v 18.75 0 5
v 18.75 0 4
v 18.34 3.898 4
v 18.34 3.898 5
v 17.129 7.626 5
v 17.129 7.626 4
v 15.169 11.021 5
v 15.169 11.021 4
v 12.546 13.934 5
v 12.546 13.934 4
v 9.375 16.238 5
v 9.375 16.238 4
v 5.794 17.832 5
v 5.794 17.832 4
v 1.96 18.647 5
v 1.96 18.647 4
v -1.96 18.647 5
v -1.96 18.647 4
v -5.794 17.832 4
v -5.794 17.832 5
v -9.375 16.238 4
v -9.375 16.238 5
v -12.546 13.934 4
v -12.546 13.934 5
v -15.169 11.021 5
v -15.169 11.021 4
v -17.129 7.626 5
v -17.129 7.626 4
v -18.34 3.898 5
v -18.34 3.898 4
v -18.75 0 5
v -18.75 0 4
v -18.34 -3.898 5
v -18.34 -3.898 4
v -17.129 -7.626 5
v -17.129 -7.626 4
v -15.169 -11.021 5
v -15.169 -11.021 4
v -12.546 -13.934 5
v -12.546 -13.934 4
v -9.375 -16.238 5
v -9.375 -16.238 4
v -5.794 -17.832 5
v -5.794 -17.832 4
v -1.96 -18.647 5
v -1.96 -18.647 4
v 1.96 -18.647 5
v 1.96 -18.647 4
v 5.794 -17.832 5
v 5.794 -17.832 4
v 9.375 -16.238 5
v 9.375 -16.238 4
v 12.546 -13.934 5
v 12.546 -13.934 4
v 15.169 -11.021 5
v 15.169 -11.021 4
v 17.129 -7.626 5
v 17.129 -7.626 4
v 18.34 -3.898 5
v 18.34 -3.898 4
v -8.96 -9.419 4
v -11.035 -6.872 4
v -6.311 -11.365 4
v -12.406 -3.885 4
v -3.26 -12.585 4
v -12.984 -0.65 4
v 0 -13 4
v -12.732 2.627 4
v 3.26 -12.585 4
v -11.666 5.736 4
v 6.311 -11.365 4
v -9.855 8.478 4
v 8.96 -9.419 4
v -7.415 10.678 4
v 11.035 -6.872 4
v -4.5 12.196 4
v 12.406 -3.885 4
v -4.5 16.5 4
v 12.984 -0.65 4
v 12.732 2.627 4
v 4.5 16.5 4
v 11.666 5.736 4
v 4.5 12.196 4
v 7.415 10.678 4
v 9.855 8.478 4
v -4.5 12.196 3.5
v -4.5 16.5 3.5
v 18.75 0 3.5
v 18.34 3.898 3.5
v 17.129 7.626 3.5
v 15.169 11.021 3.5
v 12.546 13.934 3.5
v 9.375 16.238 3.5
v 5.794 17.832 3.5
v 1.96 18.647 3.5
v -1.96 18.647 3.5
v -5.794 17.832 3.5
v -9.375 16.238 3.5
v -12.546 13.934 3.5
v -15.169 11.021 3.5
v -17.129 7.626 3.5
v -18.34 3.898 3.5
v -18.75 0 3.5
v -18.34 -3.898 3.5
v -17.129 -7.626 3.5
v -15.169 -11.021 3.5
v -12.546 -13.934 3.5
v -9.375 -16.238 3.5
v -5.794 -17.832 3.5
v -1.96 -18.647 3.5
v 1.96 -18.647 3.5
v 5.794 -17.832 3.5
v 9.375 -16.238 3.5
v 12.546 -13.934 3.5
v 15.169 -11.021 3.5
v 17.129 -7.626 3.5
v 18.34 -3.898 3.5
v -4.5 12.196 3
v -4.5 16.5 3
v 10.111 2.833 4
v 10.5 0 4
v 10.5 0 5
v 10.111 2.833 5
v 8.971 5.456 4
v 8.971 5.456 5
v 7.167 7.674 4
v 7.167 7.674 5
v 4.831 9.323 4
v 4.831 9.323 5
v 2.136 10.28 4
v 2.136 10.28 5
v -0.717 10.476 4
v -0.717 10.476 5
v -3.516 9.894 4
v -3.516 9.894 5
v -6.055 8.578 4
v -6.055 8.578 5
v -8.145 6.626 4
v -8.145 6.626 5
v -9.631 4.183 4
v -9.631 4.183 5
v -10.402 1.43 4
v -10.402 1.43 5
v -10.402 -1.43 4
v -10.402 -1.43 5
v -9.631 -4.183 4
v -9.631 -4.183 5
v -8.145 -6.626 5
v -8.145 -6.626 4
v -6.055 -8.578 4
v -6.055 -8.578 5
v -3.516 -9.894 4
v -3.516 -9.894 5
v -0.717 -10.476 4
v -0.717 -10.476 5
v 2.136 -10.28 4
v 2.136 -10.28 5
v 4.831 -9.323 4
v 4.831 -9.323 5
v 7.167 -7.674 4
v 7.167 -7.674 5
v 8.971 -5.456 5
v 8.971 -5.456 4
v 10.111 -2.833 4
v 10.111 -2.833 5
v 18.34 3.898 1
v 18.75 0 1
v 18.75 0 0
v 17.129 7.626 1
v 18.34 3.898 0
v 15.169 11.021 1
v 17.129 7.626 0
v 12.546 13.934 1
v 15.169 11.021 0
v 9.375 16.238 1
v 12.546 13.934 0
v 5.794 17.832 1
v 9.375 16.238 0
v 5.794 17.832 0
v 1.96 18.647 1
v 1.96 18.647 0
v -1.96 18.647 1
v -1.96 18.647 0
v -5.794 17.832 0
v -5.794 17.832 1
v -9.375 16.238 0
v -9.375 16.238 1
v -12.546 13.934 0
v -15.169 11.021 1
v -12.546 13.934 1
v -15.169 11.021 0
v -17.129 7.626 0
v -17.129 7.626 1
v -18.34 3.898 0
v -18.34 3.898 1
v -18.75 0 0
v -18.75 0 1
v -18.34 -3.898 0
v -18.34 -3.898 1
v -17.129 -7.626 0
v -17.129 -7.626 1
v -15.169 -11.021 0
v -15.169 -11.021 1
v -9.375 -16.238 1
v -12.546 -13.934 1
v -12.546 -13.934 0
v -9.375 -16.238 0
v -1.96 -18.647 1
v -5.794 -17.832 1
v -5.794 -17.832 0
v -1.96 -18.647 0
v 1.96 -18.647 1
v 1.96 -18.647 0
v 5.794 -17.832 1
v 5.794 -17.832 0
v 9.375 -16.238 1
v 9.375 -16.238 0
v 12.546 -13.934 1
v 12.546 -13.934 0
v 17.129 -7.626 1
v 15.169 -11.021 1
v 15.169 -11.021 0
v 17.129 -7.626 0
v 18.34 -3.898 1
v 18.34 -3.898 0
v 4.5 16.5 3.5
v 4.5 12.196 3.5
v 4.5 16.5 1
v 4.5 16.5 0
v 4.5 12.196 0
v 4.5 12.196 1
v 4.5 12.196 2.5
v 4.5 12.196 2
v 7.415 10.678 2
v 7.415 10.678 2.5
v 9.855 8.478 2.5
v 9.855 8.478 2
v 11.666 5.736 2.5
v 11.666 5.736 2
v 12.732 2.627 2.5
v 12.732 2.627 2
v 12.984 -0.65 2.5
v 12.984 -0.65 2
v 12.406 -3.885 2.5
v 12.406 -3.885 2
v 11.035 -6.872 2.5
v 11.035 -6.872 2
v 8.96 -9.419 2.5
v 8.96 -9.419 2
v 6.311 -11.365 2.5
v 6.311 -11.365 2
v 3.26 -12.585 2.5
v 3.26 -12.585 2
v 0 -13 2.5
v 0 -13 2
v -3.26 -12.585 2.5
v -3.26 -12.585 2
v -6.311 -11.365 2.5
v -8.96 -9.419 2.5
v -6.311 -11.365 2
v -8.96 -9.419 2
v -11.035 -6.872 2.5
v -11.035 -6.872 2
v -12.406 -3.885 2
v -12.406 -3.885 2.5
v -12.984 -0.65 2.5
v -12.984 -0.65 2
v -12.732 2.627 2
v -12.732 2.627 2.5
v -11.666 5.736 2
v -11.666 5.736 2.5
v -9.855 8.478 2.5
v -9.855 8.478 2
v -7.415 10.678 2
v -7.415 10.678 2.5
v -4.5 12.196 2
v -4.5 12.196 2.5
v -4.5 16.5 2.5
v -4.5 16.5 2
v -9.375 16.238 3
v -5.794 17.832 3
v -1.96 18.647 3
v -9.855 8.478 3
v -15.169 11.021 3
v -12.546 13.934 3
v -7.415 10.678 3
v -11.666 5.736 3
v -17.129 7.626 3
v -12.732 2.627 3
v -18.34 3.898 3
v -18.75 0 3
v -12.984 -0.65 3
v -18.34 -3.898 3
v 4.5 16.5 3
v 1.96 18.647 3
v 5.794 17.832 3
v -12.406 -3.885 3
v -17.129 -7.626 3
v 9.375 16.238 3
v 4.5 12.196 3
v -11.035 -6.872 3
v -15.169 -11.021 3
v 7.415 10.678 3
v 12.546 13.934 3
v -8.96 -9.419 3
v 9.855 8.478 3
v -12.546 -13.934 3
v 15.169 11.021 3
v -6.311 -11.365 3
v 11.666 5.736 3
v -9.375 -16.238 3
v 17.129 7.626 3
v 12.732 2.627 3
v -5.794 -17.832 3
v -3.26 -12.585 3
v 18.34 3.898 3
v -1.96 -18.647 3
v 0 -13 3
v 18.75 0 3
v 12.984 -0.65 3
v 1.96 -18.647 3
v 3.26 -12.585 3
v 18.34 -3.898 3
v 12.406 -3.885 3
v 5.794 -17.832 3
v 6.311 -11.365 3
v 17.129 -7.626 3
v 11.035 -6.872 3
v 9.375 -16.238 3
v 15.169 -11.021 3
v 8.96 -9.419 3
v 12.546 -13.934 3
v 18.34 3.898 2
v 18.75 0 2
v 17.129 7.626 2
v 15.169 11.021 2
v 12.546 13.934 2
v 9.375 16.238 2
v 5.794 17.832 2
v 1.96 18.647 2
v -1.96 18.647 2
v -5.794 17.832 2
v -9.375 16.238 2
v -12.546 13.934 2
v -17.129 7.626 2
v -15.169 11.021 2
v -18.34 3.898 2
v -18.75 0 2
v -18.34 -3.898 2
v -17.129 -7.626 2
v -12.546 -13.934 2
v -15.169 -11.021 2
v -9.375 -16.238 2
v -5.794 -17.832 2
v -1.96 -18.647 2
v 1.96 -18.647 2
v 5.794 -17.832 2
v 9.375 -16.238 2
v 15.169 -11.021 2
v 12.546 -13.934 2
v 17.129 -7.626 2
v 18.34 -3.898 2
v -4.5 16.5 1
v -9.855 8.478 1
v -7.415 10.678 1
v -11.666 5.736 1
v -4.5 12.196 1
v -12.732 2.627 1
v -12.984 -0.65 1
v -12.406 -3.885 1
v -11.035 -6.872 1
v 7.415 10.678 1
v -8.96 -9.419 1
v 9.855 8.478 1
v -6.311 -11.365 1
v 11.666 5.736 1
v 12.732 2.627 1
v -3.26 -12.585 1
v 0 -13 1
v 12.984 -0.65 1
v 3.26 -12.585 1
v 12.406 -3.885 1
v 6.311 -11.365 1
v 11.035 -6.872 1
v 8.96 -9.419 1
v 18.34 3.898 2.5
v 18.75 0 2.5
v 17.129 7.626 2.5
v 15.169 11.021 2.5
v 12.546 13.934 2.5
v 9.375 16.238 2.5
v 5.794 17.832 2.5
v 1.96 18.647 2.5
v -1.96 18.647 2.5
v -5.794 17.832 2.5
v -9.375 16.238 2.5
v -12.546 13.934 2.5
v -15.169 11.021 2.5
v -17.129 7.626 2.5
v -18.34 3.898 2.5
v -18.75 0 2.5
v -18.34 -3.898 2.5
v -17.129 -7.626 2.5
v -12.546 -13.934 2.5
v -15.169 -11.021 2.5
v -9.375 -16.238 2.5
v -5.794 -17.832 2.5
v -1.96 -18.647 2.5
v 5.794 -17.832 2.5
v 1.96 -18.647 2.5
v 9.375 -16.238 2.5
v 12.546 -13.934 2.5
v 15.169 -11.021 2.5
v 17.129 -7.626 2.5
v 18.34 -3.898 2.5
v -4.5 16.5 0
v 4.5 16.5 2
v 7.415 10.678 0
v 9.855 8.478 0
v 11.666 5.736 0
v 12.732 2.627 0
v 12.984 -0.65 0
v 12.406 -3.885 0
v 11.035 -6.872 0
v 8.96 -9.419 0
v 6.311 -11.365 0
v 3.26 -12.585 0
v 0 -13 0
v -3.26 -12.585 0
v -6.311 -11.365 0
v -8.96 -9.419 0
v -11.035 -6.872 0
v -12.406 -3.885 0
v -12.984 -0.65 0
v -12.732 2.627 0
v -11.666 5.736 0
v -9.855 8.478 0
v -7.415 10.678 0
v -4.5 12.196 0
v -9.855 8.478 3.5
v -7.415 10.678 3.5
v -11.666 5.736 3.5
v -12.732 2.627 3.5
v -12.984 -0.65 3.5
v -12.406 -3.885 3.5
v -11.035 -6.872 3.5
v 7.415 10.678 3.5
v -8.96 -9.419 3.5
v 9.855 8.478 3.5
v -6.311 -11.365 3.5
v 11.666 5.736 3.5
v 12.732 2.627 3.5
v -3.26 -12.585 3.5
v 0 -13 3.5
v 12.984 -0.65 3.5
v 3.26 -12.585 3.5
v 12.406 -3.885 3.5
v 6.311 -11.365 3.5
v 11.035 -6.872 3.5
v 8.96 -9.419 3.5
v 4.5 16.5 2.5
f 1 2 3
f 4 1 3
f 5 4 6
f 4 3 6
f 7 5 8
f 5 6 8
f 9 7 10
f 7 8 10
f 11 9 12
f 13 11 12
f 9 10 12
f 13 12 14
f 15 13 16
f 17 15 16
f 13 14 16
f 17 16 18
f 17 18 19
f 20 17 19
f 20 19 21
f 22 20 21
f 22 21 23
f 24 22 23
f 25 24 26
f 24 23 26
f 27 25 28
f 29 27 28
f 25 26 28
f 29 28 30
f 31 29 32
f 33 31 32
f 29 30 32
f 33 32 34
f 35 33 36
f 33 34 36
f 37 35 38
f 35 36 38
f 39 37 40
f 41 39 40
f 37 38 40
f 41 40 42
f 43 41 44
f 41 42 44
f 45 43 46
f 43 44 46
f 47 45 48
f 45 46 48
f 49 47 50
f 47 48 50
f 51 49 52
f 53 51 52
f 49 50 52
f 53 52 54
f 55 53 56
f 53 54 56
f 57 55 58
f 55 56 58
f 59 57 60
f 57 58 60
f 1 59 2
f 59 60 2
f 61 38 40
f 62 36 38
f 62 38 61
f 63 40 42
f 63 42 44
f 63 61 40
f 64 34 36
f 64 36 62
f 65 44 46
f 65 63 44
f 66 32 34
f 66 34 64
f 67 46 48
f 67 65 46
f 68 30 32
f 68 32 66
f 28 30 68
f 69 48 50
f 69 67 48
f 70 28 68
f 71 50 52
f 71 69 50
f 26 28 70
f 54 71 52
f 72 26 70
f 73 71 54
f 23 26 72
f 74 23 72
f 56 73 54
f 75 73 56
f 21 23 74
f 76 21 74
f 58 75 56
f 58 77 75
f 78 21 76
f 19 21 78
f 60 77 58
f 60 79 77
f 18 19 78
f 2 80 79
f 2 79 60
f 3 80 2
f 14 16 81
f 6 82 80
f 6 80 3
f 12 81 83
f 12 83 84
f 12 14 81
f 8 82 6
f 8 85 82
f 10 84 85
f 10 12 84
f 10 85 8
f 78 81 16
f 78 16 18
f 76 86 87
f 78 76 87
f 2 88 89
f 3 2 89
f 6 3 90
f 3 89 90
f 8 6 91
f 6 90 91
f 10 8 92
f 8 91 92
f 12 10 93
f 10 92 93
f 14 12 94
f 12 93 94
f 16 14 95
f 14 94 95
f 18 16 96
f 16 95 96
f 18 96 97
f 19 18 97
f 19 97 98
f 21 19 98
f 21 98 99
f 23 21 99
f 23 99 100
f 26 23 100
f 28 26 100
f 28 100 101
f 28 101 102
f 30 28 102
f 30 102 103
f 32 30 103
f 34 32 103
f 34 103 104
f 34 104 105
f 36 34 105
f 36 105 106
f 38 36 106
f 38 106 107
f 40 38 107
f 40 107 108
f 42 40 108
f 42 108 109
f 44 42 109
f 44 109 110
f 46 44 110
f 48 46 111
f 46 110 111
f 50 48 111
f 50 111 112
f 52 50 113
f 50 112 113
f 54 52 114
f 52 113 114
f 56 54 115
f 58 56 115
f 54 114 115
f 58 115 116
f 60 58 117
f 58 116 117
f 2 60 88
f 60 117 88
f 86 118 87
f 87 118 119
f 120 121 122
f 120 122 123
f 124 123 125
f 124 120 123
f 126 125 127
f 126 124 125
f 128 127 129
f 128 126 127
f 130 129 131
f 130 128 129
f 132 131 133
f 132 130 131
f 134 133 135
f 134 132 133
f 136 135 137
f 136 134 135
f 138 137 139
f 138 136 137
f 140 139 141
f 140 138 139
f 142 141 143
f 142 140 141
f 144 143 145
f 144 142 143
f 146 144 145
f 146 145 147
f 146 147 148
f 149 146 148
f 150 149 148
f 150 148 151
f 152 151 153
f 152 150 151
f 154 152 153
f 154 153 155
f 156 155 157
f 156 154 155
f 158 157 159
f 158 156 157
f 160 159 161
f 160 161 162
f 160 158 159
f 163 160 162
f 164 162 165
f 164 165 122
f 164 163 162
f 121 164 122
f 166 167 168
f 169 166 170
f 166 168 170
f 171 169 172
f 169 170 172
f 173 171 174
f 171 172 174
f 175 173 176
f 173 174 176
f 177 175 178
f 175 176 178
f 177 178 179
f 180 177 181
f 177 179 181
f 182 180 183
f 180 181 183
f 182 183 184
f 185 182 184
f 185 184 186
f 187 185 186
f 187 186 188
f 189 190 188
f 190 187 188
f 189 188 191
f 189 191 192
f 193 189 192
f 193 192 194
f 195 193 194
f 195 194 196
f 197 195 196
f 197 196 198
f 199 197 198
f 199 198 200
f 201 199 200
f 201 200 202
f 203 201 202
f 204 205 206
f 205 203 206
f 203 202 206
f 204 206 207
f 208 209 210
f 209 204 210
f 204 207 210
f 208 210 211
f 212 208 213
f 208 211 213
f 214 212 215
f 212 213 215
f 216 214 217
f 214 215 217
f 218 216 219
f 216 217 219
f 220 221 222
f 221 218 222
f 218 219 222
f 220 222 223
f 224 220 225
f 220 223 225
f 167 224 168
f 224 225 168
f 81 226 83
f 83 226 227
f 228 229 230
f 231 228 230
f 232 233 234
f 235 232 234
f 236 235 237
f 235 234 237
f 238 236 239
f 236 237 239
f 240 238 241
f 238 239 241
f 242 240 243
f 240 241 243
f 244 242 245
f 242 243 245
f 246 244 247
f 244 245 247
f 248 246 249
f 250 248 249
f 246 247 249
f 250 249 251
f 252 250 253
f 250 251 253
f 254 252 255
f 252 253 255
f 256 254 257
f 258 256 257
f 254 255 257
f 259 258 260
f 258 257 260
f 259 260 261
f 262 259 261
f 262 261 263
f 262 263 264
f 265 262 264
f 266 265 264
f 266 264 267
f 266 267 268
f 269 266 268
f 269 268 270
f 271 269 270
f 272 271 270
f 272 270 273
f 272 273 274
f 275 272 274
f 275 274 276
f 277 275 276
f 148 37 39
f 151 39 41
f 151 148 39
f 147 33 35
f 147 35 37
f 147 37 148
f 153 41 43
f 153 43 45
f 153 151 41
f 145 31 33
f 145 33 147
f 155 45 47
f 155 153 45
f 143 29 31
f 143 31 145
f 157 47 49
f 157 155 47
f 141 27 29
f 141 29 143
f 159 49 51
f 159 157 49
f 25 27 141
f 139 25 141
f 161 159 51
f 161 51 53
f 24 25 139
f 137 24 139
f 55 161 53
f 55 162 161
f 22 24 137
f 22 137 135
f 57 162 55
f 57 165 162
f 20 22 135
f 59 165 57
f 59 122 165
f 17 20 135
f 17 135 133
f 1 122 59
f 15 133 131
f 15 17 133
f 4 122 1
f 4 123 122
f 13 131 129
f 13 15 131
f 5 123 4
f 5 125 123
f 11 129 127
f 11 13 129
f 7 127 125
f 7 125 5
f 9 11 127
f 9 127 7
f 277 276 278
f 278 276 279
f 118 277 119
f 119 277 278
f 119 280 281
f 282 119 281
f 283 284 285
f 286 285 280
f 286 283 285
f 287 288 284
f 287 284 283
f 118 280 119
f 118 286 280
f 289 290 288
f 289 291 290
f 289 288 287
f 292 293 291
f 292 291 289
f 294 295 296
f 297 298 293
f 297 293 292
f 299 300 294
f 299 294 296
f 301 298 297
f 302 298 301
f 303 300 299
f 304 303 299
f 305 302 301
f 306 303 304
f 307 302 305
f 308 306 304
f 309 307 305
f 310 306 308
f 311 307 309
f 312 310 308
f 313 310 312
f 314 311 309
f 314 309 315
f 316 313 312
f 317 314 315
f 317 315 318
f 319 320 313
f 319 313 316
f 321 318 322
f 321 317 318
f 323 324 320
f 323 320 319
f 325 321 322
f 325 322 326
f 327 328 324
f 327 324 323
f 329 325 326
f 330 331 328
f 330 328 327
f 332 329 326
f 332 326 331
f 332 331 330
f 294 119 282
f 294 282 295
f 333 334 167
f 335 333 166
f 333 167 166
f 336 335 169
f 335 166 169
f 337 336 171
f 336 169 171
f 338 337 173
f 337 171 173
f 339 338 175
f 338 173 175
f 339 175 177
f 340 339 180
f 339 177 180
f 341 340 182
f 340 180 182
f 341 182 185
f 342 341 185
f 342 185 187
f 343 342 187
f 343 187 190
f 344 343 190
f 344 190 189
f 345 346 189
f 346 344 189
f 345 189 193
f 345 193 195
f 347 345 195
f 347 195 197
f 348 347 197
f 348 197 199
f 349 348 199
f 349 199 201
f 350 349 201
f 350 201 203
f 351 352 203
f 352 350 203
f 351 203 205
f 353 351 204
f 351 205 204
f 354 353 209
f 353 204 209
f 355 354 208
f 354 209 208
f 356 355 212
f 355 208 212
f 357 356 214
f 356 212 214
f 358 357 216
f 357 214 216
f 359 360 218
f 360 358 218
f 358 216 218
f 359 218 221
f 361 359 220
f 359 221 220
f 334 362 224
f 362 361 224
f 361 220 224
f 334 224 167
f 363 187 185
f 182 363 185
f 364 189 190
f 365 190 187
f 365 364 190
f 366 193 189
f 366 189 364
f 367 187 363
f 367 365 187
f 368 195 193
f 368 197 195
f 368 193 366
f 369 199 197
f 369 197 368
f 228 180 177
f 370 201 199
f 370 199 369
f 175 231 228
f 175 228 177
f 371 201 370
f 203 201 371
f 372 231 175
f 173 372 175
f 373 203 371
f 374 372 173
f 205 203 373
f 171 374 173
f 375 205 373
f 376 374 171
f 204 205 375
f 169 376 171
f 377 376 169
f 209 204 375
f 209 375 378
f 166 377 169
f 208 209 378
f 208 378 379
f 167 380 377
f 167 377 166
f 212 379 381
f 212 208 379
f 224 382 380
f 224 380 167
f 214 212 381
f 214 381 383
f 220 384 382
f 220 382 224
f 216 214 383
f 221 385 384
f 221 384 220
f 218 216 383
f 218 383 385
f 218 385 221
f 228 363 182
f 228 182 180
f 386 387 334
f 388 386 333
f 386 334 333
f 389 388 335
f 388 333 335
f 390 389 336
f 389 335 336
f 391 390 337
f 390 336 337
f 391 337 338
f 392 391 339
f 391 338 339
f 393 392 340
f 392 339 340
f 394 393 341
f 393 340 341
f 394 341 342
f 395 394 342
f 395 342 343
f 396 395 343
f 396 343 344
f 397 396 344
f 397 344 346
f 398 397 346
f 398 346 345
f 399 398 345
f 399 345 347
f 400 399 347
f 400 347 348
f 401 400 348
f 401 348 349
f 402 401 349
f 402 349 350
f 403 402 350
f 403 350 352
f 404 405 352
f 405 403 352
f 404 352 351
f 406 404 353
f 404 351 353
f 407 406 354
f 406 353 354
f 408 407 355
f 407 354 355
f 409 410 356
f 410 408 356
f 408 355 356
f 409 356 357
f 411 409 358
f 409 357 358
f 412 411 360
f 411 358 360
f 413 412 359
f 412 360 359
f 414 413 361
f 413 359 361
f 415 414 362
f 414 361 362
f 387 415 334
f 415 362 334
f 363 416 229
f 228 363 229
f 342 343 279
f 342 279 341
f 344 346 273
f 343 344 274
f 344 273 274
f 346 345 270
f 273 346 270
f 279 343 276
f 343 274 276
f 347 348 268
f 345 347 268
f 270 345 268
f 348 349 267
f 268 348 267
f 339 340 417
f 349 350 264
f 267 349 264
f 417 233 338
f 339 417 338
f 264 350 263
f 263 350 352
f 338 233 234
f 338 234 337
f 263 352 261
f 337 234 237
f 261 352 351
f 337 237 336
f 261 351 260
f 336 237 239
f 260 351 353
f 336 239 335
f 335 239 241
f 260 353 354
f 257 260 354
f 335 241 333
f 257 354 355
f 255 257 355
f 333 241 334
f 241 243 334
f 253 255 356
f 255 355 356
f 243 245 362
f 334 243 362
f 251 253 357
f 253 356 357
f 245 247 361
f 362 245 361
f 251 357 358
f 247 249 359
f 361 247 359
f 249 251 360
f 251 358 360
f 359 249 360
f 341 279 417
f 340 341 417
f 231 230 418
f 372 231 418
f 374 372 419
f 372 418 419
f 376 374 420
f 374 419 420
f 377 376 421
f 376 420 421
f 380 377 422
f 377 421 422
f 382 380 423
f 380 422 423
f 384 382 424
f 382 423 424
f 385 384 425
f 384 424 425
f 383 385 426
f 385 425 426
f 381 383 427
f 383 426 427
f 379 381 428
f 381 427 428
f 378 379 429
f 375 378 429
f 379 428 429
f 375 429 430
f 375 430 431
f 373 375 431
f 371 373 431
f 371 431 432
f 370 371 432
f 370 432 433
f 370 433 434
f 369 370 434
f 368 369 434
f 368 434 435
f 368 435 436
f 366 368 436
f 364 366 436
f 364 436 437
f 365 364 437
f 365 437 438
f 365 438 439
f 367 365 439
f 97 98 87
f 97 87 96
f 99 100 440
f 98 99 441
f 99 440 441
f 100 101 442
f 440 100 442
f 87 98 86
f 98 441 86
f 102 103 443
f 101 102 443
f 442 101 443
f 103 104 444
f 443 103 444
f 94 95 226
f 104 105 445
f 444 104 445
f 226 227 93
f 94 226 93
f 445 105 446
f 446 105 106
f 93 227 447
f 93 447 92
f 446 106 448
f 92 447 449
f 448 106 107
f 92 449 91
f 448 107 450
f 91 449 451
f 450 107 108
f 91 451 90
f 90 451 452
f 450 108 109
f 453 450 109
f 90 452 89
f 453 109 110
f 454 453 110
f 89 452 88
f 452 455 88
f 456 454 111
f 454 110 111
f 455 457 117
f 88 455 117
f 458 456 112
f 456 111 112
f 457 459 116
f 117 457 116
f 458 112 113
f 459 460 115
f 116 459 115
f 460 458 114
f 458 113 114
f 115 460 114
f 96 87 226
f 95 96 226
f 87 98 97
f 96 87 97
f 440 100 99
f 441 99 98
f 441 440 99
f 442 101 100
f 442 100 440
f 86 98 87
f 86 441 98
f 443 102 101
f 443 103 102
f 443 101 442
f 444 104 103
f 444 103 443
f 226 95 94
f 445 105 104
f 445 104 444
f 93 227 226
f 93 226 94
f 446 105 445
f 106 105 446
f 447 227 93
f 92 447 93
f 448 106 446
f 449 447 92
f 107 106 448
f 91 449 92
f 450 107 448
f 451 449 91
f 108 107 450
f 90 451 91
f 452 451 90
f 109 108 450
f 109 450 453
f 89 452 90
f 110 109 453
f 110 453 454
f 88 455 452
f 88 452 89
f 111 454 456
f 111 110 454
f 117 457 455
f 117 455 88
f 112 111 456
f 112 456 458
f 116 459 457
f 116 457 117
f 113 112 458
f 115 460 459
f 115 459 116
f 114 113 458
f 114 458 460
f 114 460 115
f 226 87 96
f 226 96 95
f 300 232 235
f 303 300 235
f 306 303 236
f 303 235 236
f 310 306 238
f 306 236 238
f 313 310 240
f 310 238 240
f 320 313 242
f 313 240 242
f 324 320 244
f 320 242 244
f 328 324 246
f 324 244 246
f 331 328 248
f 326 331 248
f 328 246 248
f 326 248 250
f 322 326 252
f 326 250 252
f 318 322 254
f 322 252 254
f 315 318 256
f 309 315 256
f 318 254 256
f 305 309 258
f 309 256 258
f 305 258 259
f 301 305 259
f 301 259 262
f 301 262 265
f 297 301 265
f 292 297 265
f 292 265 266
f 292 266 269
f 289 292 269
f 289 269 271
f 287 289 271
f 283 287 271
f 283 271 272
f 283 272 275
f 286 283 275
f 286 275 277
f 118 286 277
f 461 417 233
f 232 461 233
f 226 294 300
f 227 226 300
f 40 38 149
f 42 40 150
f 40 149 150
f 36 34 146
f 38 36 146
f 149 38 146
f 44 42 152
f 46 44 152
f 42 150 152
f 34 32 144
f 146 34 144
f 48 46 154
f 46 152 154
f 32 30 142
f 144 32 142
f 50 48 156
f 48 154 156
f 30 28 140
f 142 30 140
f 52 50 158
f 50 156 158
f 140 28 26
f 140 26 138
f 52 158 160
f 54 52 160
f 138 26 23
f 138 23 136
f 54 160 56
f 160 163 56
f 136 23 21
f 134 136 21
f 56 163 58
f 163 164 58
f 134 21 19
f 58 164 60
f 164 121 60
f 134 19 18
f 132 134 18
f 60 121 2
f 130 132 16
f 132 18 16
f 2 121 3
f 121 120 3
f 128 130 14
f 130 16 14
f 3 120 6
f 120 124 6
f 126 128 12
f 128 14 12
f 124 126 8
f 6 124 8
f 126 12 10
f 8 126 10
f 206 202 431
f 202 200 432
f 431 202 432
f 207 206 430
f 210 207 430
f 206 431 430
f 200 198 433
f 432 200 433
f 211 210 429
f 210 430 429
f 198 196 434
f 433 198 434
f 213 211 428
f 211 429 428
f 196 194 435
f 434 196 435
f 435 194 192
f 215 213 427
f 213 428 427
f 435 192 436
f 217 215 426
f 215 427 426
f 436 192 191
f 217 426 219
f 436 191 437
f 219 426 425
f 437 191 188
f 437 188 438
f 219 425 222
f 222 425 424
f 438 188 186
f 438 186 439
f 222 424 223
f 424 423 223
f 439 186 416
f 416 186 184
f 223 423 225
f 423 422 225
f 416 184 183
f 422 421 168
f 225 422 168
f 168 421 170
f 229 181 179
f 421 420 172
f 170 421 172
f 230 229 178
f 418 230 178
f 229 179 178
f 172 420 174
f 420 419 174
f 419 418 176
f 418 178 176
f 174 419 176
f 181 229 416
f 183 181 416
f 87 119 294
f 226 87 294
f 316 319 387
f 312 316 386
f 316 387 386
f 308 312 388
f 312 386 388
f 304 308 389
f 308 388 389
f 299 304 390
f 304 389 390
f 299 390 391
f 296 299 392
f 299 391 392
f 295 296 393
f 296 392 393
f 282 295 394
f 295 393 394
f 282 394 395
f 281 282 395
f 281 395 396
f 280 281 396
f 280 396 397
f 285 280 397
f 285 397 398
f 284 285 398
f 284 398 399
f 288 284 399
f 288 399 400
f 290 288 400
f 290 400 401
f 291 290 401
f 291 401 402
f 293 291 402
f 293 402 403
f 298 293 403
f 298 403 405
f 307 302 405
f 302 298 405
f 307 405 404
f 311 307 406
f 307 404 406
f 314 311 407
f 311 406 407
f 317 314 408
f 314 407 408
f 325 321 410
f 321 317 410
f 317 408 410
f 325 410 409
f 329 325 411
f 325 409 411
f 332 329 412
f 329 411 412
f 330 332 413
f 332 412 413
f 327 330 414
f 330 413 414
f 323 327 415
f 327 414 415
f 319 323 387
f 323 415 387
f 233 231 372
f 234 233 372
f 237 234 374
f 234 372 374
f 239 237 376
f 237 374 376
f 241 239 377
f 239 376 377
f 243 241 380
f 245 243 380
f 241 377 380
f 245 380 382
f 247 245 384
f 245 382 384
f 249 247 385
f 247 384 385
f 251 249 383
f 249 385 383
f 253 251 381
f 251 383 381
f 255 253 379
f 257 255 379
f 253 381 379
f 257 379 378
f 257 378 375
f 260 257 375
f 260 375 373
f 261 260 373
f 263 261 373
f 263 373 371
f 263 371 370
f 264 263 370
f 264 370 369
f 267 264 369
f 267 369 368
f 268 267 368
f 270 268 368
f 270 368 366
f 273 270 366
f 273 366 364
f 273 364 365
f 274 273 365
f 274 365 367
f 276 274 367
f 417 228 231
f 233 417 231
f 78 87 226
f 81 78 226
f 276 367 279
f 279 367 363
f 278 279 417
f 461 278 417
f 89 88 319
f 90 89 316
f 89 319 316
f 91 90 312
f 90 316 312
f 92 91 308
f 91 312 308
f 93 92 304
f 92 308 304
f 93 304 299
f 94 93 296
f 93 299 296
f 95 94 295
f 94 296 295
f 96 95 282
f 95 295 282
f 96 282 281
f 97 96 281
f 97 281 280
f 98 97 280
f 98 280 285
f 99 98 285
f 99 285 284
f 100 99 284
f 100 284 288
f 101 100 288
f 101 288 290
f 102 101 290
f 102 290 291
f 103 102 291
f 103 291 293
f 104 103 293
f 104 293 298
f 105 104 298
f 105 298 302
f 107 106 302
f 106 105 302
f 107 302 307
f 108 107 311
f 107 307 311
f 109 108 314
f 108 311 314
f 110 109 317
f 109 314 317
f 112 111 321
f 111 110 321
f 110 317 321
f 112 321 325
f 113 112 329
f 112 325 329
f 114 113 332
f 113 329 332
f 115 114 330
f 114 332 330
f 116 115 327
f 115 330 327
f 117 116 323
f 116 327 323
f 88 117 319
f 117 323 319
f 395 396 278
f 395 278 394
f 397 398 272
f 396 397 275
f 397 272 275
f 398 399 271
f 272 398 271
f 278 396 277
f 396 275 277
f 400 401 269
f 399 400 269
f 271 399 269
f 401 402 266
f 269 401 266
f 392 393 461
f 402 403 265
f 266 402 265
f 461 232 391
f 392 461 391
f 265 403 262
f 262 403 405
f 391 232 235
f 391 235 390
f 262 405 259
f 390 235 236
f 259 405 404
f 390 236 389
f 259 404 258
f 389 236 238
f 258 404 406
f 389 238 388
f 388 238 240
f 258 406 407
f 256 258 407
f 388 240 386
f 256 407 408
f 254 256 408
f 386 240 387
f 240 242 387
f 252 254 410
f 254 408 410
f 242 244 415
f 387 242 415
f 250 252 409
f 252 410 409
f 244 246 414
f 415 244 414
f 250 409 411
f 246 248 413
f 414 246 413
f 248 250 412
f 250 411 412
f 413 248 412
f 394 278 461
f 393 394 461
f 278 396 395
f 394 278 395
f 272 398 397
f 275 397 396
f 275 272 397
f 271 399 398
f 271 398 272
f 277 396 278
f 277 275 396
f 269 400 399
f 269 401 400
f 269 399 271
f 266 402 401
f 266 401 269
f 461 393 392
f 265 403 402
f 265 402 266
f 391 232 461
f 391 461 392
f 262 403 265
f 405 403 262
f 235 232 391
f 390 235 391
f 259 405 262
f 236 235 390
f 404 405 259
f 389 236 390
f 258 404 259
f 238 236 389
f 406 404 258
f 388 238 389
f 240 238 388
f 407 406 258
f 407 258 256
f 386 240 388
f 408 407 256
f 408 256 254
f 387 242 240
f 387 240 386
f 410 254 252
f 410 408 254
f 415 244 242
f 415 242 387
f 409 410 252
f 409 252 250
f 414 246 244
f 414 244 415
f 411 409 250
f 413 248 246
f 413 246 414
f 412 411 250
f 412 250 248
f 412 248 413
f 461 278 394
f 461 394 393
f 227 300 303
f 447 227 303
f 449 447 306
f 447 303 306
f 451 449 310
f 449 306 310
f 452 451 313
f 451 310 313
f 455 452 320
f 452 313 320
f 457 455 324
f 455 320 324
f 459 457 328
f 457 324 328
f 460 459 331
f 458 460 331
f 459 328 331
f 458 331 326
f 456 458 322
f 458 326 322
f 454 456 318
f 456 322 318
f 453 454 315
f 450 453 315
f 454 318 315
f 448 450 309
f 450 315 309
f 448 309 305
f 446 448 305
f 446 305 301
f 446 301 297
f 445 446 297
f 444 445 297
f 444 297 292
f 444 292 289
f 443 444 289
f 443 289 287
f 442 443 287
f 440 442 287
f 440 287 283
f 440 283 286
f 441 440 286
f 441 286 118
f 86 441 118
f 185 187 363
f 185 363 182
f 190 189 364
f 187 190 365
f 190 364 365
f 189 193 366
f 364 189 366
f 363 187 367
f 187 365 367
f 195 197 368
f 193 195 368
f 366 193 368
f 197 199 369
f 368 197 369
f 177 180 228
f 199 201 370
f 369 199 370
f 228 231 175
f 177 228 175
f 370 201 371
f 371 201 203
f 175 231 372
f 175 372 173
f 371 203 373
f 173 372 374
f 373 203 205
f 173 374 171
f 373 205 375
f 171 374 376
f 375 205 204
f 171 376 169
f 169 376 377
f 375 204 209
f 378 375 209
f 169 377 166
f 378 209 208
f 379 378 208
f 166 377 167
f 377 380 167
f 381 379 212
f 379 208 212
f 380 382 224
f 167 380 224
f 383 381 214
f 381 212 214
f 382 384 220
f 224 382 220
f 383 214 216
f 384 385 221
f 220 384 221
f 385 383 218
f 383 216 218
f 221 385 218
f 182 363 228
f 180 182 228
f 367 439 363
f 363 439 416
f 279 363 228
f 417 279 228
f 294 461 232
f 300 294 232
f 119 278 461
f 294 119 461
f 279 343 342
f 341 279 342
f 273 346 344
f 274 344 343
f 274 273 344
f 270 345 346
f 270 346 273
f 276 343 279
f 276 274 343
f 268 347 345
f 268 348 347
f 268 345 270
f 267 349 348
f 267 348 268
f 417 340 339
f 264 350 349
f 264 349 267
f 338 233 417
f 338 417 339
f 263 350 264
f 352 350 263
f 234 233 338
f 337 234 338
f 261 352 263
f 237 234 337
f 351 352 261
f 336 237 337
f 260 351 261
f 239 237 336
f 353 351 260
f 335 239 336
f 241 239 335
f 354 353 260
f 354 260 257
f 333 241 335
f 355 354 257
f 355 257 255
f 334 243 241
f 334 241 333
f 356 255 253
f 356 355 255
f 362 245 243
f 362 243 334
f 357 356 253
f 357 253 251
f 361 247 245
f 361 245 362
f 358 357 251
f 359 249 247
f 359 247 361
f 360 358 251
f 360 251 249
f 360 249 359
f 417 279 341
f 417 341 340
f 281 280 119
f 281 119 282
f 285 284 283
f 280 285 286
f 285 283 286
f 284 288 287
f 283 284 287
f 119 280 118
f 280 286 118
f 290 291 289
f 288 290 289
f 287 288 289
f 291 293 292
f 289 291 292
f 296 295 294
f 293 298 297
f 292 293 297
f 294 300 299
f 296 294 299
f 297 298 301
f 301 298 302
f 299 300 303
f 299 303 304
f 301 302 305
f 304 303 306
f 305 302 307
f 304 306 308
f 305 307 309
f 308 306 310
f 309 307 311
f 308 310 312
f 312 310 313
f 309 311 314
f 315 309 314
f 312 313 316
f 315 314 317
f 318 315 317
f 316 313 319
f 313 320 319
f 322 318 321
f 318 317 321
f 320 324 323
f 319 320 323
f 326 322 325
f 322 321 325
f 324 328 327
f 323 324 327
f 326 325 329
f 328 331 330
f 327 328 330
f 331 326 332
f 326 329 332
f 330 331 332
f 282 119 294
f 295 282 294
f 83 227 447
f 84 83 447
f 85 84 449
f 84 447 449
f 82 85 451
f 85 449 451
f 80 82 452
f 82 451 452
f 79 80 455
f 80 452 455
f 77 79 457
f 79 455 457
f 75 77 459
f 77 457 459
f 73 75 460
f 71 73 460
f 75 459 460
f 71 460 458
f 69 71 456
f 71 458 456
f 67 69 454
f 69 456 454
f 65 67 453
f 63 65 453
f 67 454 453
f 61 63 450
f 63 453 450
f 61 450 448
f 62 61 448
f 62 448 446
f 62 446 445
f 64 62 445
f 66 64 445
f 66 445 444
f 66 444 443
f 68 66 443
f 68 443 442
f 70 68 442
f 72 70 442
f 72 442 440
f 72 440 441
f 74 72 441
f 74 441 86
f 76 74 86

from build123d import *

# Parameters (mm, degrees)
SKETCH_1_R                        = 18.75
EXTRUDE_1_DEPTH                   = 4
SPLIT_BODIES_1_SURFACE_3_1_BACK   = 54.184
SPLIT_BODIES_1_SURFACE_3_1_DEPTH  = 108.368
SPLIT_BODIES_1_SURFACE_3_2_BACK   = 54.184
SPLIT_BODIES_1_SURFACE_3_2_DEPTH  = 108.368
SPLIT_BODIES_1_SURFACE_4_3_BACK   = 54.184
SPLIT_BODIES_1_SURFACE_4_3_DEPTH  = 108.368
SPLIT_BODIES_1_SURFACE_4_4_BACK   = 54.184
SPLIT_BODIES_1_SURFACE_4_4_DEPTH  = 108.368
SPLIT_BODIES_1_SURFACE_5_5_BACK   = 54.184
SPLIT_BODIES_1_SURFACE_5_5_DEPTH  = 108.368
SPLIT_BODIES_1_SURFACE_5_6_BACK   = 54.184
SPLIT_BODIES_1_SURFACE_5_6_DEPTH  = 108.368
SPLIT_BODIES_1_SURFACE_6_7_BACK   = 54.184
SPLIT_BODIES_1_SURFACE_6_7_DEPTH  = 108.368
SPLIT_BODIES_1_SURFACE_6_8_BACK   = 54.184
SPLIT_BODIES_1_SURFACE_6_8_DEPTH  = 108.368
SPLIT_BODIES_1_SURFACE_7_9_BACK   = 54.184
SPLIT_BODIES_1_SURFACE_7_9_DEPTH  = 108.368
SPLIT_BODIES_1_SURFACE_7_10_BACK  = 54.184
SPLIT_BODIES_1_SURFACE_7_10_DEPTH = 108.368
SKETCH_3_R                        = 18.75
SKETCH_3_R_2                      = 10.5
EXTRUDE_2_DEPTH                   = 1


with BuildPart() as part:
    # Эскиз1 → Вытянуть1 (new body)
    with BuildSketch(Plane.XY):
        Circle(SKETCH_1_R)
        with BuildLine():
            Line((-4.5, 16.5), (4.5, 16.5))
            Line((4.5, 16.5), (4.5, 12.196310918))
            ThreePointArc((4.5, 12.196310918), (0, -13), (-4.5, 12.196310918))
            Line((-4.5, 12.196310918), (-4.5, 16.5))
        make_face(mode=Mode.SUBTRACT)
    extrude(amount=EXTRUDE_1_DEPTH)


with BuildPart() as body_2_3:
    # Split Bodies 1 3: the piece behind the surface
    add(part.part)
    # Split Bodies 1 surface 3: a surface, the sketch's curves swept straight by 108.368 mm
    with BuildLine(Plane(origin=(0, 0, 0), x_dir=(1, 0, 0), z_dir=(0, 1, 0)).offset(-SPLIT_BODIES_1_SURFACE_3_1_BACK), mode=Mode.PRIVATE) as split_bodies_1_surface_3_1_path:
        Line((-18.75, -1), (18.75, -1))
    split_bodies_1_surface_3_1 = Shell.extrude(split_bodies_1_surface_3_1_path.wire(), (0 * SPLIT_BODIES_1_SURFACE_3_1_DEPTH, 1 * SPLIT_BODIES_1_SURFACE_3_1_DEPTH, 0 * SPLIT_BODIES_1_SURFACE_3_1_DEPTH))
    split(bisect_by=split_bodies_1_surface_3_1, keep=Keep.BOTTOM)


with BuildPart() as part_1:
    add(part.part)

    # Split Bodies 1 3: split by a surface, the side it looks to stays
    # Split Bodies 1 surface 3: a surface, the sketch's curves swept straight by 108.368 mm
    with BuildLine(Plane(origin=(0, 0, 0), x_dir=(1, 0, 0), z_dir=(0, 1, 0)).offset(-SPLIT_BODIES_1_SURFACE_3_2_BACK), mode=Mode.PRIVATE) as split_bodies_1_surface_3_2_path:
        Line((-18.75, -1), (18.75, -1))
    split_bodies_1_surface_3_2 = Shell.extrude(split_bodies_1_surface_3_2_path.wire(), (0 * SPLIT_BODIES_1_SURFACE_3_2_DEPTH, 1 * SPLIT_BODIES_1_SURFACE_3_2_DEPTH, 0 * SPLIT_BODIES_1_SURFACE_3_2_DEPTH))
    split(bisect_by=split_bodies_1_surface_3_2, keep=Keep.TOP)


with BuildPart() as body_3:
    # Split Bodies 1 4 body 2 3: the piece behind the surface
    add(body_2_3.part)
    # Split Bodies 1 surface 4: a surface, the sketch's curves swept straight by 108.368 mm
    with BuildLine(Plane(origin=(0, 0, 0), x_dir=(1, 0, 0), z_dir=(0, 1, 0)).offset(-SPLIT_BODIES_1_SURFACE_4_3_BACK), mode=Mode.PRIVATE) as split_bodies_1_surface_4_3_path:
        Line((-18.75, -2), (18.75, -2))
    split_bodies_1_surface_4_3 = Shell.extrude(split_bodies_1_surface_4_3_path.wire(), (0 * SPLIT_BODIES_1_SURFACE_4_3_DEPTH, 1 * SPLIT_BODIES_1_SURFACE_4_3_DEPTH, 0 * SPLIT_BODIES_1_SURFACE_4_3_DEPTH))
    split(bisect_by=split_bodies_1_surface_4_3, keep=Keep.BOTTOM)


with BuildPart() as body_2_3_1:
    add(body_2_3.part)

    # Split Bodies 1 4 body 2 3: split by a surface, the side it looks to stays
    # Split Bodies 1 surface 4: a surface, the sketch's curves swept straight by 108.368 mm
    with BuildLine(Plane(origin=(0, 0, 0), x_dir=(1, 0, 0), z_dir=(0, 1, 0)).offset(-SPLIT_BODIES_1_SURFACE_4_4_BACK), mode=Mode.PRIVATE) as split_bodies_1_surface_4_4_path:
        Line((-18.75, -2), (18.75, -2))
    split_bodies_1_surface_4_4 = Shell.extrude(split_bodies_1_surface_4_4_path.wire(), (0 * SPLIT_BODIES_1_SURFACE_4_4_DEPTH, 1 * SPLIT_BODIES_1_SURFACE_4_4_DEPTH, 0 * SPLIT_BODIES_1_SURFACE_4_4_DEPTH))
    split(bisect_by=split_bodies_1_surface_4_4, keep=Keep.TOP)


with BuildPart() as body_4:
    # Split Bodies 1 5 body 3: the piece behind the surface
    add(body_3.part)
    # Split Bodies 1 surface 5: a surface, the sketch's curves swept straight by 108.368 mm
    with BuildLine(Plane(origin=(0, 0, 0), x_dir=(1, 0, 0), z_dir=(0, 1, 0)).offset(-SPLIT_BODIES_1_SURFACE_5_5_BACK), mode=Mode.PRIVATE) as split_bodies_1_surface_5_5_path:
        Line((-18.75, -2.5), (18.75, -2.5))
    split_bodies_1_surface_5_5 = Shell.extrude(split_bodies_1_surface_5_5_path.wire(), (0 * SPLIT_BODIES_1_SURFACE_5_5_DEPTH, 1 * SPLIT_BODIES_1_SURFACE_5_5_DEPTH, 0 * SPLIT_BODIES_1_SURFACE_5_5_DEPTH))
    split(bisect_by=split_bodies_1_surface_5_5, keep=Keep.BOTTOM)


with BuildPart() as body_3_1:
    add(body_3.part)

    # Split Bodies 1 5 body 3: split by a surface, the side it looks to stays
    # Split Bodies 1 surface 5: a surface, the sketch's curves swept straight by 108.368 mm
    with BuildLine(Plane(origin=(0, 0, 0), x_dir=(1, 0, 0), z_dir=(0, 1, 0)).offset(-SPLIT_BODIES_1_SURFACE_5_6_BACK), mode=Mode.PRIVATE) as split_bodies_1_surface_5_6_path:
        Line((-18.75, -2.5), (18.75, -2.5))
    split_bodies_1_surface_5_6 = Shell.extrude(split_bodies_1_surface_5_6_path.wire(), (0 * SPLIT_BODIES_1_SURFACE_5_6_DEPTH, 1 * SPLIT_BODIES_1_SURFACE_5_6_DEPTH, 0 * SPLIT_BODIES_1_SURFACE_5_6_DEPTH))
    split(bisect_by=split_bodies_1_surface_5_6, keep=Keep.TOP)


with BuildPart() as body_5:
    # Split Bodies 1 6 body 4: the piece behind the surface
    add(body_4.part)
    # Split Bodies 1 surface 6: a surface, the sketch's curves swept straight by 108.368 mm
    with BuildLine(Plane(origin=(0, 0, 0), x_dir=(1, 0, 0), z_dir=(0, 1, 0)).offset(-SPLIT_BODIES_1_SURFACE_6_7_BACK), mode=Mode.PRIVATE) as split_bodies_1_surface_6_7_path:
        Line((-18.75, -3), (18.75, -3))
    split_bodies_1_surface_6_7 = Shell.extrude(split_bodies_1_surface_6_7_path.wire(), (0 * SPLIT_BODIES_1_SURFACE_6_7_DEPTH, 1 * SPLIT_BODIES_1_SURFACE_6_7_DEPTH, 0 * SPLIT_BODIES_1_SURFACE_6_7_DEPTH))
    split(bisect_by=split_bodies_1_surface_6_7, keep=Keep.BOTTOM)


with BuildPart() as body_4_1:
    add(body_4.part)

    # Split Bodies 1 6 body 4: split by a surface, the side it looks to stays
    # Split Bodies 1 surface 6: a surface, the sketch's curves swept straight by 108.368 mm
    with BuildLine(Plane(origin=(0, 0, 0), x_dir=(1, 0, 0), z_dir=(0, 1, 0)).offset(-SPLIT_BODIES_1_SURFACE_6_8_BACK), mode=Mode.PRIVATE) as split_bodies_1_surface_6_8_path:
        Line((-18.75, -3), (18.75, -3))
    split_bodies_1_surface_6_8 = Shell.extrude(split_bodies_1_surface_6_8_path.wire(), (0 * SPLIT_BODIES_1_SURFACE_6_8_DEPTH, 1 * SPLIT_BODIES_1_SURFACE_6_8_DEPTH, 0 * SPLIT_BODIES_1_SURFACE_6_8_DEPTH))
    split(bisect_by=split_bodies_1_surface_6_8, keep=Keep.TOP)


with BuildPart() as body_6:
    # Split Bodies 1 7 body 5: the piece behind the surface
    add(body_5.part)
    # Split Bodies 1 surface 7: a surface, the sketch's curves swept straight by 108.368 mm
    with BuildLine(Plane(origin=(0, 0, 0), x_dir=(1, 0, 0), z_dir=(0, 1, 0)).offset(-SPLIT_BODIES_1_SURFACE_7_9_BACK), mode=Mode.PRIVATE) as split_bodies_1_surface_7_9_path:
        Line((-18.75, -3.5), (18.75, -3.5))
    split_bodies_1_surface_7_9 = Shell.extrude(split_bodies_1_surface_7_9_path.wire(), (0 * SPLIT_BODIES_1_SURFACE_7_9_DEPTH, 1 * SPLIT_BODIES_1_SURFACE_7_9_DEPTH, 0 * SPLIT_BODIES_1_SURFACE_7_9_DEPTH))
    split(bisect_by=split_bodies_1_surface_7_9, keep=Keep.BOTTOM)


with BuildPart() as body_5_1:
    add(body_5.part)

    # Split Bodies 1 7 body 5: split by a surface, the side it looks to stays
    # Split Bodies 1 surface 7: a surface, the sketch's curves swept straight by 108.368 mm
    with BuildLine(Plane(origin=(0, 0, 0), x_dir=(1, 0, 0), z_dir=(0, 1, 0)).offset(-SPLIT_BODIES_1_SURFACE_7_10_BACK), mode=Mode.PRIVATE) as split_bodies_1_surface_7_10_path:
        Line((-18.75, -3.5), (18.75, -3.5))
    split_bodies_1_surface_7_10 = Shell.extrude(split_bodies_1_surface_7_10_path.wire(), (0 * SPLIT_BODIES_1_SURFACE_7_10_DEPTH, 1 * SPLIT_BODIES_1_SURFACE_7_10_DEPTH, 0 * SPLIT_BODIES_1_SURFACE_7_10_DEPTH))
    split(bisect_by=split_bodies_1_surface_7_10, keep=Keep.TOP)


with BuildPart() as body_7:
    # Эскиз3 → Вытянуть2 (new body)
    with BuildSketch(Plane.XY.offset(4)):
        Circle(SKETCH_3_R)
        Circle(SKETCH_3_R_2, mode=Mode.SUBTRACT)
    extrude(amount=EXTRUDE_2_DEPTH)


solid = Compound([part_1.part, body_2_3_1.part, body_3_1.part, body_4_1.part, body_6.part, body_5_1.part, body_7.part])
